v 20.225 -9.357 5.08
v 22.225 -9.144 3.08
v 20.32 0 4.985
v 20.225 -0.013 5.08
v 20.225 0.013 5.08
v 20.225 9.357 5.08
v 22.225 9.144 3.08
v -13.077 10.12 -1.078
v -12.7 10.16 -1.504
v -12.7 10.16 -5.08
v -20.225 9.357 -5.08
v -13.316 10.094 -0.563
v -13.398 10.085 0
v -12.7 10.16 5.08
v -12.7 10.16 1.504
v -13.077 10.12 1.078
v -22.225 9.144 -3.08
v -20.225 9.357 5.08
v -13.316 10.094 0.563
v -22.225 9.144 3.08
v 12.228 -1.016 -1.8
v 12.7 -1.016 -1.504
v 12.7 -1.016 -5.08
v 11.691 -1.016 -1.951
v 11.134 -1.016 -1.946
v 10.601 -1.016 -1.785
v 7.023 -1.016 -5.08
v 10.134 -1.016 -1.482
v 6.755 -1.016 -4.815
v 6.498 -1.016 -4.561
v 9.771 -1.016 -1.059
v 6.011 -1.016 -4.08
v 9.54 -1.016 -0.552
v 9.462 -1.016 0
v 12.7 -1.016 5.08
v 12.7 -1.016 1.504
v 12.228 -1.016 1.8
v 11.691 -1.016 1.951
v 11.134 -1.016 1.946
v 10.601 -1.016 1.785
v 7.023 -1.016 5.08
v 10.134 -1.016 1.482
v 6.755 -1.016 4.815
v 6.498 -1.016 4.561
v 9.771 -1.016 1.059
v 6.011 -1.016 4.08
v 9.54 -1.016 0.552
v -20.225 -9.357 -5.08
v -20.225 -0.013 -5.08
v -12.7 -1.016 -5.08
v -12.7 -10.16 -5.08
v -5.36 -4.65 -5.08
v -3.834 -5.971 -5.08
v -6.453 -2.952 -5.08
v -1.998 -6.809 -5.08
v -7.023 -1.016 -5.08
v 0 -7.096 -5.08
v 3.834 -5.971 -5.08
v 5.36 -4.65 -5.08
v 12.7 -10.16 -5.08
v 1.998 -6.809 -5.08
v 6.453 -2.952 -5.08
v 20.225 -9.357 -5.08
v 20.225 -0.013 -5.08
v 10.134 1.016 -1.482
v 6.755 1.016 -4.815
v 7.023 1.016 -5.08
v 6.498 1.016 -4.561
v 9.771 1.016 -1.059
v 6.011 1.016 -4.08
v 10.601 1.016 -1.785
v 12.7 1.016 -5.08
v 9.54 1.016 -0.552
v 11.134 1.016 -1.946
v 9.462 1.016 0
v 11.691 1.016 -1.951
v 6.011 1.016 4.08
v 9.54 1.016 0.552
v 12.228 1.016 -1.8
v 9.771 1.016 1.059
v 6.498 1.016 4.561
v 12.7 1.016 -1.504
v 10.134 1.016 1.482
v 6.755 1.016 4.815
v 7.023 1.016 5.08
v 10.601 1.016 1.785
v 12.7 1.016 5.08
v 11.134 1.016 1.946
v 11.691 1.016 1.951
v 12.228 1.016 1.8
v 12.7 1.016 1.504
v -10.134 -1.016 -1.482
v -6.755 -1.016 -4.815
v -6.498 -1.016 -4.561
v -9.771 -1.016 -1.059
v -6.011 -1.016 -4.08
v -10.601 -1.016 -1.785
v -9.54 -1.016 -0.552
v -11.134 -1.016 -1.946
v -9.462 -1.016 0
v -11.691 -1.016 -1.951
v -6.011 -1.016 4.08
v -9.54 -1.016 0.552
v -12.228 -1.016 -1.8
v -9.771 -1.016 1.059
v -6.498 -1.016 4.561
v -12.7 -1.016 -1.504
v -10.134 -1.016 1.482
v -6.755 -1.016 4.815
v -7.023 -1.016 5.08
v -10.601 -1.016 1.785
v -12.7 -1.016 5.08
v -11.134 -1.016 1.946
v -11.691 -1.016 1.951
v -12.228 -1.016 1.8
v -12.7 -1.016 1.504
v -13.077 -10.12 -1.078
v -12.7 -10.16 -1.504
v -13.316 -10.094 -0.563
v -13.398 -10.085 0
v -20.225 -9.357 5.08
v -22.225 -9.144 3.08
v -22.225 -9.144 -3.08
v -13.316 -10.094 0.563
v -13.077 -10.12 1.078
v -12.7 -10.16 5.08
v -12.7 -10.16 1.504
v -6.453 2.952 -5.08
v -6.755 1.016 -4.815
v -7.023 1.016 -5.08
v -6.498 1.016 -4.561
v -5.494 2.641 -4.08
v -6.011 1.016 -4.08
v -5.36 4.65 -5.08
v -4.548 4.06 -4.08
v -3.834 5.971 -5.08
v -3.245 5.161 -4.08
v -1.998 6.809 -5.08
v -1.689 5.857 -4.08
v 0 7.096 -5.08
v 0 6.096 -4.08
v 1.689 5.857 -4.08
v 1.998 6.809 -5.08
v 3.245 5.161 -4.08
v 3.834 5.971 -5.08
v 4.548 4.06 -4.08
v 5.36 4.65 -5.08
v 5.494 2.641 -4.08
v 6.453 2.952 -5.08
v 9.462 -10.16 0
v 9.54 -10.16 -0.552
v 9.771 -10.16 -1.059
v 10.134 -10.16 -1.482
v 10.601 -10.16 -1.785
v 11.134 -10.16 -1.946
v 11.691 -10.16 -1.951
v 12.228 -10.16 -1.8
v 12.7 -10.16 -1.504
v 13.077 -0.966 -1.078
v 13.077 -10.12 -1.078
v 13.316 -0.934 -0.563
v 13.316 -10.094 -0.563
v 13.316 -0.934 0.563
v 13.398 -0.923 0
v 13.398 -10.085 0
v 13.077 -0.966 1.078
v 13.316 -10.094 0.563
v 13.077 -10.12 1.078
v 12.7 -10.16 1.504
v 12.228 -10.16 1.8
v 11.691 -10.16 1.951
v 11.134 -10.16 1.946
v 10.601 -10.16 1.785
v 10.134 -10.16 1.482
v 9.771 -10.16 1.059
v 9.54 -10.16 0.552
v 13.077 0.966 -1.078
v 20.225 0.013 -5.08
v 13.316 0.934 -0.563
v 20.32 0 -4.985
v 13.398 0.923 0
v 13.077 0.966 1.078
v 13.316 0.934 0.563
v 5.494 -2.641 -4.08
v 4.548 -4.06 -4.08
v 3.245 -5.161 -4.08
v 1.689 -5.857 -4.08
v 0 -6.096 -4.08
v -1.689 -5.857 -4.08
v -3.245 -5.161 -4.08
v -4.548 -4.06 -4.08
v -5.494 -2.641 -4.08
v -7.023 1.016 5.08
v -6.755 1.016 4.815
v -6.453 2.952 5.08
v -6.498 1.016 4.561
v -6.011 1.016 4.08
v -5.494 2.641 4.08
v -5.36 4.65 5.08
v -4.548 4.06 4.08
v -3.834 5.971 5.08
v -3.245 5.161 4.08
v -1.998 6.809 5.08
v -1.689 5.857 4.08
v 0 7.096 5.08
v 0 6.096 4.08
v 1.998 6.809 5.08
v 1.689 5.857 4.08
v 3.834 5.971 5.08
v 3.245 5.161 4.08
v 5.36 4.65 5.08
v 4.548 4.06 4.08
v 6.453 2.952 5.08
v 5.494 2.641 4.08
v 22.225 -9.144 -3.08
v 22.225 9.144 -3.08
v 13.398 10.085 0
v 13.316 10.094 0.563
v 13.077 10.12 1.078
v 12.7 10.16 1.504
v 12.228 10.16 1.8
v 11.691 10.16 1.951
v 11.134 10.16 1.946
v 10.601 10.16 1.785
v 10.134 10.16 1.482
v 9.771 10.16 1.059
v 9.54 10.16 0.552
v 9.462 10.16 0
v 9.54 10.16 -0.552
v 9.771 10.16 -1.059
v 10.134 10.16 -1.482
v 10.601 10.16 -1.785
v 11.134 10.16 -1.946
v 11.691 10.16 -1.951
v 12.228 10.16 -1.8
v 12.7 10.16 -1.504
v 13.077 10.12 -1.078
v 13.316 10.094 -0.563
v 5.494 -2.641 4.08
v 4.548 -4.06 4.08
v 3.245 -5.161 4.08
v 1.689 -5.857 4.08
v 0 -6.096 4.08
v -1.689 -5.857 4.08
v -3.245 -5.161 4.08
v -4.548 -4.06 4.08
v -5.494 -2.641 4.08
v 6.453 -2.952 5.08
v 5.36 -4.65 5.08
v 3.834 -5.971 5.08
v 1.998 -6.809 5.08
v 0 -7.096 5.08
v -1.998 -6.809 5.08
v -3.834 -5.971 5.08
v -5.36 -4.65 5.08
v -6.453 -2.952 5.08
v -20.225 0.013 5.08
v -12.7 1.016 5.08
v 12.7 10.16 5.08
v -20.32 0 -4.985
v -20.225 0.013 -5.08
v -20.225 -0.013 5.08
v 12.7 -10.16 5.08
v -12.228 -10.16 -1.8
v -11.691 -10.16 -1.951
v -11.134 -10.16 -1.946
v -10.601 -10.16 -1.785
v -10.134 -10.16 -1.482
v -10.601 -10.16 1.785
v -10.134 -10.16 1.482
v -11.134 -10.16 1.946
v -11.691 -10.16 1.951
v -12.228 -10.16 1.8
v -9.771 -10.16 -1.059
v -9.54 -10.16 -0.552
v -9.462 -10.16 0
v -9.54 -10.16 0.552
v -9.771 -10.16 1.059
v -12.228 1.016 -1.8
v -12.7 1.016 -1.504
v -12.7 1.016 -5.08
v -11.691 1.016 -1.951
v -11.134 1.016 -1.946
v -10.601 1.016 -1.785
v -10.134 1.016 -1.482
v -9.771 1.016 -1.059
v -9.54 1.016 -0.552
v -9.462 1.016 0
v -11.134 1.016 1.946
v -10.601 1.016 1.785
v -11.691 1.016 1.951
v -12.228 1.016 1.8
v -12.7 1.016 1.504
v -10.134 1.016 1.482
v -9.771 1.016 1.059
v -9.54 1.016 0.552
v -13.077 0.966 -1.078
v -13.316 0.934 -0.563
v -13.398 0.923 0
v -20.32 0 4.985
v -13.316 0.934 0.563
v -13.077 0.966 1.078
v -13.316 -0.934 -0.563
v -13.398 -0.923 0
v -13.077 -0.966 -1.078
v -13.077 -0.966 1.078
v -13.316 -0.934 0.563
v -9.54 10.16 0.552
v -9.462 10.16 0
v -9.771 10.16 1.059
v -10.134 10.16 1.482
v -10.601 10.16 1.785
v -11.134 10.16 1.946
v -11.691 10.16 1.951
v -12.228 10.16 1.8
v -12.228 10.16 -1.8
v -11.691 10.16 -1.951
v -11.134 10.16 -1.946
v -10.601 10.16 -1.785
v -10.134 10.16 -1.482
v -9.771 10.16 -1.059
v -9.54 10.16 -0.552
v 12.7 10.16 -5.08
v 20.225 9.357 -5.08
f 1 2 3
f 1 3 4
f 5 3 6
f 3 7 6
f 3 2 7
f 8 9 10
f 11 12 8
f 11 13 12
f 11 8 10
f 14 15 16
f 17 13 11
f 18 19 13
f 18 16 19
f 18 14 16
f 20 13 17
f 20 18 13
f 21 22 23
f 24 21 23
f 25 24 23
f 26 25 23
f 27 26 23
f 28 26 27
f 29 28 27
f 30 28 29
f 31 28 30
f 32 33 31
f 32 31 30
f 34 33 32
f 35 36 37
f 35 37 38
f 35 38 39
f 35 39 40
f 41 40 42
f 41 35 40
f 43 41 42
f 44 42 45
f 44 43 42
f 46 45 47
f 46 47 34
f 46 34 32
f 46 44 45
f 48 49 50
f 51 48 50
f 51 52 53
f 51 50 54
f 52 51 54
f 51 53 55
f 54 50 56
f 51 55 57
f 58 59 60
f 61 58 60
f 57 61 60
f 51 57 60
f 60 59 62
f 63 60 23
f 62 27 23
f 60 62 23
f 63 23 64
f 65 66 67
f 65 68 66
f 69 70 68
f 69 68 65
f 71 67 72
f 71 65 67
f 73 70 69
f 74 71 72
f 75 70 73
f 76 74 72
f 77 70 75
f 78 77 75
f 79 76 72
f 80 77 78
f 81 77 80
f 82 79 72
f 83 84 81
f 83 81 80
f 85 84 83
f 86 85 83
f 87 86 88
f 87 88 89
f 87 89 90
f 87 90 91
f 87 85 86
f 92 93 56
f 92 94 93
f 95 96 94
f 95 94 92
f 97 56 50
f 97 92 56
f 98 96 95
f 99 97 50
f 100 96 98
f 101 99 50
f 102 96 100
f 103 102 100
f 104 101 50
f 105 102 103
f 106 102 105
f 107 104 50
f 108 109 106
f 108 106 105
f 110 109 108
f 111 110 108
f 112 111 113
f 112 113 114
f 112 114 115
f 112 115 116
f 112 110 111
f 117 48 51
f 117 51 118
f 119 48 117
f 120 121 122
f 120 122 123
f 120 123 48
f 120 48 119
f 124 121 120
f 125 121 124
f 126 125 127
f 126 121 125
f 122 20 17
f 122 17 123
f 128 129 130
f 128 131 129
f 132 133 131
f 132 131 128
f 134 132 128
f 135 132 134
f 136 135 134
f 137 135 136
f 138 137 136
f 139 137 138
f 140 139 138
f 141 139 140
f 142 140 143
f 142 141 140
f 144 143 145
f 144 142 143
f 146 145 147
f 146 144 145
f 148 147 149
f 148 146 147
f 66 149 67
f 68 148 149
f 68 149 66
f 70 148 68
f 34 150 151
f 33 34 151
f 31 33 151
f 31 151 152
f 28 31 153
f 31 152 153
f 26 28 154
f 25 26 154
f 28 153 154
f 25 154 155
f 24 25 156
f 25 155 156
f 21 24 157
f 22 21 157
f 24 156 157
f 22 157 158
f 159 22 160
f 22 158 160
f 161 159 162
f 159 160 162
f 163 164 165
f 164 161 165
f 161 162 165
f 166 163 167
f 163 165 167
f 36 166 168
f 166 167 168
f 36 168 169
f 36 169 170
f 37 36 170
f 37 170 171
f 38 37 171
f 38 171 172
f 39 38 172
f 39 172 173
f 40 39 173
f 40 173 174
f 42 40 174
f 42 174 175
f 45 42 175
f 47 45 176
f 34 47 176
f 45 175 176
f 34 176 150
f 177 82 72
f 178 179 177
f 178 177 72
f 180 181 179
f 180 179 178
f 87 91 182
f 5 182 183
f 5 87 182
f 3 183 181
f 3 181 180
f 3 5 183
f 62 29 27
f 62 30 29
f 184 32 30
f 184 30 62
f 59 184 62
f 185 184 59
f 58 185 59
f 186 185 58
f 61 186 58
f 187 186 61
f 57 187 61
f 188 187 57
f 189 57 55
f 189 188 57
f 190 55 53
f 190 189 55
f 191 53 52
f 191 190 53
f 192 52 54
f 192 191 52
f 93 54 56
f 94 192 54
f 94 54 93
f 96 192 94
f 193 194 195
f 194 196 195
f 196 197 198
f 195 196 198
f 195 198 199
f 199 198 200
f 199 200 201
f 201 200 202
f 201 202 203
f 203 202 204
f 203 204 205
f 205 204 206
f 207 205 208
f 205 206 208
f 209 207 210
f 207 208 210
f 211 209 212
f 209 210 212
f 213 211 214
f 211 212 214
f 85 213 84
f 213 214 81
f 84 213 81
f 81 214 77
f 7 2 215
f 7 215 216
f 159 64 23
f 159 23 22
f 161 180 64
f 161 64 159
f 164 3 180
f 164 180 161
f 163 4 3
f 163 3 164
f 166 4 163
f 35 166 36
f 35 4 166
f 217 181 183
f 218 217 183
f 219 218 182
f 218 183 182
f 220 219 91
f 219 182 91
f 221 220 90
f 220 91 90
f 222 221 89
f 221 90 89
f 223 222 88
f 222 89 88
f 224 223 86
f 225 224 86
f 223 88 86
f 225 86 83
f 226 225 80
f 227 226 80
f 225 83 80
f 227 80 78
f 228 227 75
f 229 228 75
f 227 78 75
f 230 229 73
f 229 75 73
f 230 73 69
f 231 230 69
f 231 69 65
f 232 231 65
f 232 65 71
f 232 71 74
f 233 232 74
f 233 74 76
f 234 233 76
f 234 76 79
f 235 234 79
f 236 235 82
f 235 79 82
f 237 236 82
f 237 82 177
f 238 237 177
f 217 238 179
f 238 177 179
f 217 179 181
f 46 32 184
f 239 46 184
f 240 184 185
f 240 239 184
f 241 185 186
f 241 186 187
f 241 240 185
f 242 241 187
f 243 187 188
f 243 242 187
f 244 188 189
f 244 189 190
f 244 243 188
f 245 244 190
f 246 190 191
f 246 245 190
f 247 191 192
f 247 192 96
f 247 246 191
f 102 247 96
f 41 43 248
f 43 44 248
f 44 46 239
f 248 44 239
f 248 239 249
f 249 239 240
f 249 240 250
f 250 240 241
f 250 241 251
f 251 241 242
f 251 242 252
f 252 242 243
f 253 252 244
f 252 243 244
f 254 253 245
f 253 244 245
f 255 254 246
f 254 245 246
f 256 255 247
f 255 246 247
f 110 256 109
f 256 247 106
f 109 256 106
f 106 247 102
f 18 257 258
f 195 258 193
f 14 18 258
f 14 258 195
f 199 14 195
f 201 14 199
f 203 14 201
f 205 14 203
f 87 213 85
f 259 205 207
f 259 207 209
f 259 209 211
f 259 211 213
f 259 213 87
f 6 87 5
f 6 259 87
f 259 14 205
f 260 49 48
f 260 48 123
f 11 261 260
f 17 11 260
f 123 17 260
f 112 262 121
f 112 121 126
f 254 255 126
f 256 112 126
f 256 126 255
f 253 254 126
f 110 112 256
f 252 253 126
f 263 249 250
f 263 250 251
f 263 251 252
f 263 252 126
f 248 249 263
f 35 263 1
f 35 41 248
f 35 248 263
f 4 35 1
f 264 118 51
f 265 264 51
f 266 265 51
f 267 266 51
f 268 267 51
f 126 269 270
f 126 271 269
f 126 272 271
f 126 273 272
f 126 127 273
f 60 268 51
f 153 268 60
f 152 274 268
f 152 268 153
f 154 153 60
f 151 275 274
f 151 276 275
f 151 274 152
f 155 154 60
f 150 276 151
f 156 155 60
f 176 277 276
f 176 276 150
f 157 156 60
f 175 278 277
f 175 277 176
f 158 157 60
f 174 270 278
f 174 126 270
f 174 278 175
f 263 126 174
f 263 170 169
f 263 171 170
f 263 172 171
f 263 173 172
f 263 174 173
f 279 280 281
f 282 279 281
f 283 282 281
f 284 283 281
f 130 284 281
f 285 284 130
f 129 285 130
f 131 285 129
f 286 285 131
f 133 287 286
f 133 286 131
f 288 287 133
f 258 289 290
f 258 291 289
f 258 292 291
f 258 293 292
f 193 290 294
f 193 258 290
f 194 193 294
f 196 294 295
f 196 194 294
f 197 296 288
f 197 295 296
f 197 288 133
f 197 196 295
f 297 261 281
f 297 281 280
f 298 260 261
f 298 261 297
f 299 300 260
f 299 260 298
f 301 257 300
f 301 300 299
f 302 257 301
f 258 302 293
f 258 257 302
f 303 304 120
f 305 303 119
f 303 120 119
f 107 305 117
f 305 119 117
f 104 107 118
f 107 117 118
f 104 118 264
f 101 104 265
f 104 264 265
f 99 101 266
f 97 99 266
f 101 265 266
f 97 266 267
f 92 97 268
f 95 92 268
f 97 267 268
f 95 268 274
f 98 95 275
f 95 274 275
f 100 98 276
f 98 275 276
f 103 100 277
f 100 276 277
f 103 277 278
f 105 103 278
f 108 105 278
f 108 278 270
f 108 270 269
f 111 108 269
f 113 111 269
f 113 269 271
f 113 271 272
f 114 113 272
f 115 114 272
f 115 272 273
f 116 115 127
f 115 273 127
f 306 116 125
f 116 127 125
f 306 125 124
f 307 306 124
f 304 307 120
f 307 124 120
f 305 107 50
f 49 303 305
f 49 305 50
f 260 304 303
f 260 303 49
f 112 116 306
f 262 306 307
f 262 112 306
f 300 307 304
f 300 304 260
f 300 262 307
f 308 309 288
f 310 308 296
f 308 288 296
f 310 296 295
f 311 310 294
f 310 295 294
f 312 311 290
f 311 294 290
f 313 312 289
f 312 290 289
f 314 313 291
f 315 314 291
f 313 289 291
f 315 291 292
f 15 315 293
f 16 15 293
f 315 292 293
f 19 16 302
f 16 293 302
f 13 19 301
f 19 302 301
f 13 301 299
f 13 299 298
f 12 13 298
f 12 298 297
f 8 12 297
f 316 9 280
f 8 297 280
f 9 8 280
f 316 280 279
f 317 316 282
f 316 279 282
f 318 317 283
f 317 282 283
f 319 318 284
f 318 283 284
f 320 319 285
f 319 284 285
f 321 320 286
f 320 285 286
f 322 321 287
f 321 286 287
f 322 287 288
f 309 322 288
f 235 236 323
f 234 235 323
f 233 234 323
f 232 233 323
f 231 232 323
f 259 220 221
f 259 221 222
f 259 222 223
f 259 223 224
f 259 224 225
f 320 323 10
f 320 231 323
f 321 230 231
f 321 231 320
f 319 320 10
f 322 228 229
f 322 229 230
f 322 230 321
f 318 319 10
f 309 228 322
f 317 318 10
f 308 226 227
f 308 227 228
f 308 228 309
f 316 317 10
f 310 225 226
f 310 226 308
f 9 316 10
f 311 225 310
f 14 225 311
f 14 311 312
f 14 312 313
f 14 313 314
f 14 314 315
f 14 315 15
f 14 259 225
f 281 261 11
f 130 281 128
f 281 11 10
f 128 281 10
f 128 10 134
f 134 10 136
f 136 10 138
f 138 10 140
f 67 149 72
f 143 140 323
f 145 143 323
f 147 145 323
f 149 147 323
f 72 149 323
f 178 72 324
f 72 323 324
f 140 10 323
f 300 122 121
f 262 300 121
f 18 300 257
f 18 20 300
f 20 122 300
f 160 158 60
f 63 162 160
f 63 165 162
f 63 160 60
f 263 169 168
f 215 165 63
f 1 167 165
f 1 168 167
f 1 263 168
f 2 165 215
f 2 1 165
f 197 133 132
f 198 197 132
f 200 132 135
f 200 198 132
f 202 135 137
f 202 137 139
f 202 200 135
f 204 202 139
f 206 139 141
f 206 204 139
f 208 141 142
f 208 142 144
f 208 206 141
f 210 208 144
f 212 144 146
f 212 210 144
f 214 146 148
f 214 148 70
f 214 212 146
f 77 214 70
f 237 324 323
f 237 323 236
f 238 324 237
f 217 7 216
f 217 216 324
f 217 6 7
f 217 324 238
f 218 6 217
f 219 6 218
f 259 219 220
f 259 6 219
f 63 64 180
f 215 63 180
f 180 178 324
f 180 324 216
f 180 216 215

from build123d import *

# Parameters (mm, degrees)
F1_DEPTH    = 5.08
F3_D        = 3.937
F3_DEPTH    = 12.7
F3_TIP      = 1.1827941286
F4_D        = 3.937
F4_DEPTH    = 12.7
F4_START    = 1.016
F4_TIP      = 1.1827941286
F5_T1_DEPTH = 28.5747319519
F6_SIZE     = 1


# Not quite as in the source:
# - a fillet or chamfer that OpenCascade refuses, or shapes differently, is made with other operations: its cross-section is extruded or revolved along the edge and cut away or added


with BuildPart() as f1:
    # F0 (on Top) → F1 (new body, symmetric)
    with BuildSketch(Plane.XY):
        Polygon((-12.7, -10.16), (12.7, -10.16), (22.225, -9.144), (22.225, 9.144), (12.7, 10.16), (-12.7, 10.16), (-22.225, 9.144), (-22.225, -9.144), align=None)
        with BuildLine():
            ThreePointArc((6.0107370596, -1.016), (0, -6.096), (-6.0107370596, -1.016))
            Line((-6.0107370596, -1.016), (-12.7, -1.016))
            Line((-12.7, -1.016), (-20.32, 0))
            Line((-20.32, 0), (-12.7, 1.016))
            Line((-12.7, 1.016), (-6.0107370596, 1.016))
            ThreePointArc((-6.0107370596, 1.016), (0, 6.096), (6.0107370596, 1.016))
            Line((6.0107370596, 1.016), (12.7, 1.016))
            Line((12.7, 1.016), (20.32, 0))
            Line((20.32, 0), (12.7, -1.016))
            Line((12.7, -1.016), (6.0107370596, -1.016))
        make_face(mode=Mode.SUBTRACT)
    extrude(amount=F1_DEPTH, both=True)

    # F3 (one way)
    with BuildSketch(Plane.XZ):
        with Locations((-11.43, 0), (11.43, 0)):
            Circle(F3_D / 2)
    extrude(amount=-F3_DEPTH, mode=Mode.SUBTRACT)
    with Locations(Plane.XZ):
        with Locations((-11.43, 0), (11.43, 0)):
            with Locations((0, 0, -(F3_DEPTH + F3_TIP / 2))):  # 118° drill point
                Cone(0, F3_D / 2, F3_TIP, mode=Mode.SUBTRACT)

    # F4
    # its depths count from where the whole tool has entered the part; down to there all is cleared
    with Locations(Plane(origin=(0, 0, 0), x_dir=(1, 0, 0), z_dir=(0, 1, 0)).offset(-F4_START)):
        with Locations((-11.43, 0), (11.43, 0)):
            Hole(F4_D / 2, depth=F4_DEPTH)
            with Locations((0, 0, -(F4_DEPTH + F4_TIP / 2))):  # 118° drill point
                Cone(0, F4_D / 2, F4_TIP, mode=Mode.SUBTRACT)

    # F5: chamfer of 2 on 4 edges, made by hand

    # F5_s2 → F5_t1 (cut)
    with BuildSketch(Plane.XZ.offset(-14.2873659759)):
        Polygon((20.225, -5.08), (22.225, -3.08), (22.225, -5.08), align=None)
        Polygon((22.225, 3.08), (20.225, 5.08), (22.225, 5.08), align=None)
        Polygon((-22.225, 3.08), (-20.225, 5.08), (-22.225, 5.08), align=None)
        Polygon((-20.225, -5.08), (-22.225, -3.08), (-22.225, -5.08), align=None)
    extrude(amount=F5_T1_DEPTH, mode=Mode.SUBTRACT)

    # F6
    f6_edges = [f1.edges().sort_by_distance(p)[0] for p in [
        (0, -6.096, -5.08),
        (0, -6.096, 5.08),
        (0, 6.096, 5.08),
        (0, 6.096, -5.08),
    ]]
    chamfer(f6_edges, length=F6_SIZE)


solid = f1.part
